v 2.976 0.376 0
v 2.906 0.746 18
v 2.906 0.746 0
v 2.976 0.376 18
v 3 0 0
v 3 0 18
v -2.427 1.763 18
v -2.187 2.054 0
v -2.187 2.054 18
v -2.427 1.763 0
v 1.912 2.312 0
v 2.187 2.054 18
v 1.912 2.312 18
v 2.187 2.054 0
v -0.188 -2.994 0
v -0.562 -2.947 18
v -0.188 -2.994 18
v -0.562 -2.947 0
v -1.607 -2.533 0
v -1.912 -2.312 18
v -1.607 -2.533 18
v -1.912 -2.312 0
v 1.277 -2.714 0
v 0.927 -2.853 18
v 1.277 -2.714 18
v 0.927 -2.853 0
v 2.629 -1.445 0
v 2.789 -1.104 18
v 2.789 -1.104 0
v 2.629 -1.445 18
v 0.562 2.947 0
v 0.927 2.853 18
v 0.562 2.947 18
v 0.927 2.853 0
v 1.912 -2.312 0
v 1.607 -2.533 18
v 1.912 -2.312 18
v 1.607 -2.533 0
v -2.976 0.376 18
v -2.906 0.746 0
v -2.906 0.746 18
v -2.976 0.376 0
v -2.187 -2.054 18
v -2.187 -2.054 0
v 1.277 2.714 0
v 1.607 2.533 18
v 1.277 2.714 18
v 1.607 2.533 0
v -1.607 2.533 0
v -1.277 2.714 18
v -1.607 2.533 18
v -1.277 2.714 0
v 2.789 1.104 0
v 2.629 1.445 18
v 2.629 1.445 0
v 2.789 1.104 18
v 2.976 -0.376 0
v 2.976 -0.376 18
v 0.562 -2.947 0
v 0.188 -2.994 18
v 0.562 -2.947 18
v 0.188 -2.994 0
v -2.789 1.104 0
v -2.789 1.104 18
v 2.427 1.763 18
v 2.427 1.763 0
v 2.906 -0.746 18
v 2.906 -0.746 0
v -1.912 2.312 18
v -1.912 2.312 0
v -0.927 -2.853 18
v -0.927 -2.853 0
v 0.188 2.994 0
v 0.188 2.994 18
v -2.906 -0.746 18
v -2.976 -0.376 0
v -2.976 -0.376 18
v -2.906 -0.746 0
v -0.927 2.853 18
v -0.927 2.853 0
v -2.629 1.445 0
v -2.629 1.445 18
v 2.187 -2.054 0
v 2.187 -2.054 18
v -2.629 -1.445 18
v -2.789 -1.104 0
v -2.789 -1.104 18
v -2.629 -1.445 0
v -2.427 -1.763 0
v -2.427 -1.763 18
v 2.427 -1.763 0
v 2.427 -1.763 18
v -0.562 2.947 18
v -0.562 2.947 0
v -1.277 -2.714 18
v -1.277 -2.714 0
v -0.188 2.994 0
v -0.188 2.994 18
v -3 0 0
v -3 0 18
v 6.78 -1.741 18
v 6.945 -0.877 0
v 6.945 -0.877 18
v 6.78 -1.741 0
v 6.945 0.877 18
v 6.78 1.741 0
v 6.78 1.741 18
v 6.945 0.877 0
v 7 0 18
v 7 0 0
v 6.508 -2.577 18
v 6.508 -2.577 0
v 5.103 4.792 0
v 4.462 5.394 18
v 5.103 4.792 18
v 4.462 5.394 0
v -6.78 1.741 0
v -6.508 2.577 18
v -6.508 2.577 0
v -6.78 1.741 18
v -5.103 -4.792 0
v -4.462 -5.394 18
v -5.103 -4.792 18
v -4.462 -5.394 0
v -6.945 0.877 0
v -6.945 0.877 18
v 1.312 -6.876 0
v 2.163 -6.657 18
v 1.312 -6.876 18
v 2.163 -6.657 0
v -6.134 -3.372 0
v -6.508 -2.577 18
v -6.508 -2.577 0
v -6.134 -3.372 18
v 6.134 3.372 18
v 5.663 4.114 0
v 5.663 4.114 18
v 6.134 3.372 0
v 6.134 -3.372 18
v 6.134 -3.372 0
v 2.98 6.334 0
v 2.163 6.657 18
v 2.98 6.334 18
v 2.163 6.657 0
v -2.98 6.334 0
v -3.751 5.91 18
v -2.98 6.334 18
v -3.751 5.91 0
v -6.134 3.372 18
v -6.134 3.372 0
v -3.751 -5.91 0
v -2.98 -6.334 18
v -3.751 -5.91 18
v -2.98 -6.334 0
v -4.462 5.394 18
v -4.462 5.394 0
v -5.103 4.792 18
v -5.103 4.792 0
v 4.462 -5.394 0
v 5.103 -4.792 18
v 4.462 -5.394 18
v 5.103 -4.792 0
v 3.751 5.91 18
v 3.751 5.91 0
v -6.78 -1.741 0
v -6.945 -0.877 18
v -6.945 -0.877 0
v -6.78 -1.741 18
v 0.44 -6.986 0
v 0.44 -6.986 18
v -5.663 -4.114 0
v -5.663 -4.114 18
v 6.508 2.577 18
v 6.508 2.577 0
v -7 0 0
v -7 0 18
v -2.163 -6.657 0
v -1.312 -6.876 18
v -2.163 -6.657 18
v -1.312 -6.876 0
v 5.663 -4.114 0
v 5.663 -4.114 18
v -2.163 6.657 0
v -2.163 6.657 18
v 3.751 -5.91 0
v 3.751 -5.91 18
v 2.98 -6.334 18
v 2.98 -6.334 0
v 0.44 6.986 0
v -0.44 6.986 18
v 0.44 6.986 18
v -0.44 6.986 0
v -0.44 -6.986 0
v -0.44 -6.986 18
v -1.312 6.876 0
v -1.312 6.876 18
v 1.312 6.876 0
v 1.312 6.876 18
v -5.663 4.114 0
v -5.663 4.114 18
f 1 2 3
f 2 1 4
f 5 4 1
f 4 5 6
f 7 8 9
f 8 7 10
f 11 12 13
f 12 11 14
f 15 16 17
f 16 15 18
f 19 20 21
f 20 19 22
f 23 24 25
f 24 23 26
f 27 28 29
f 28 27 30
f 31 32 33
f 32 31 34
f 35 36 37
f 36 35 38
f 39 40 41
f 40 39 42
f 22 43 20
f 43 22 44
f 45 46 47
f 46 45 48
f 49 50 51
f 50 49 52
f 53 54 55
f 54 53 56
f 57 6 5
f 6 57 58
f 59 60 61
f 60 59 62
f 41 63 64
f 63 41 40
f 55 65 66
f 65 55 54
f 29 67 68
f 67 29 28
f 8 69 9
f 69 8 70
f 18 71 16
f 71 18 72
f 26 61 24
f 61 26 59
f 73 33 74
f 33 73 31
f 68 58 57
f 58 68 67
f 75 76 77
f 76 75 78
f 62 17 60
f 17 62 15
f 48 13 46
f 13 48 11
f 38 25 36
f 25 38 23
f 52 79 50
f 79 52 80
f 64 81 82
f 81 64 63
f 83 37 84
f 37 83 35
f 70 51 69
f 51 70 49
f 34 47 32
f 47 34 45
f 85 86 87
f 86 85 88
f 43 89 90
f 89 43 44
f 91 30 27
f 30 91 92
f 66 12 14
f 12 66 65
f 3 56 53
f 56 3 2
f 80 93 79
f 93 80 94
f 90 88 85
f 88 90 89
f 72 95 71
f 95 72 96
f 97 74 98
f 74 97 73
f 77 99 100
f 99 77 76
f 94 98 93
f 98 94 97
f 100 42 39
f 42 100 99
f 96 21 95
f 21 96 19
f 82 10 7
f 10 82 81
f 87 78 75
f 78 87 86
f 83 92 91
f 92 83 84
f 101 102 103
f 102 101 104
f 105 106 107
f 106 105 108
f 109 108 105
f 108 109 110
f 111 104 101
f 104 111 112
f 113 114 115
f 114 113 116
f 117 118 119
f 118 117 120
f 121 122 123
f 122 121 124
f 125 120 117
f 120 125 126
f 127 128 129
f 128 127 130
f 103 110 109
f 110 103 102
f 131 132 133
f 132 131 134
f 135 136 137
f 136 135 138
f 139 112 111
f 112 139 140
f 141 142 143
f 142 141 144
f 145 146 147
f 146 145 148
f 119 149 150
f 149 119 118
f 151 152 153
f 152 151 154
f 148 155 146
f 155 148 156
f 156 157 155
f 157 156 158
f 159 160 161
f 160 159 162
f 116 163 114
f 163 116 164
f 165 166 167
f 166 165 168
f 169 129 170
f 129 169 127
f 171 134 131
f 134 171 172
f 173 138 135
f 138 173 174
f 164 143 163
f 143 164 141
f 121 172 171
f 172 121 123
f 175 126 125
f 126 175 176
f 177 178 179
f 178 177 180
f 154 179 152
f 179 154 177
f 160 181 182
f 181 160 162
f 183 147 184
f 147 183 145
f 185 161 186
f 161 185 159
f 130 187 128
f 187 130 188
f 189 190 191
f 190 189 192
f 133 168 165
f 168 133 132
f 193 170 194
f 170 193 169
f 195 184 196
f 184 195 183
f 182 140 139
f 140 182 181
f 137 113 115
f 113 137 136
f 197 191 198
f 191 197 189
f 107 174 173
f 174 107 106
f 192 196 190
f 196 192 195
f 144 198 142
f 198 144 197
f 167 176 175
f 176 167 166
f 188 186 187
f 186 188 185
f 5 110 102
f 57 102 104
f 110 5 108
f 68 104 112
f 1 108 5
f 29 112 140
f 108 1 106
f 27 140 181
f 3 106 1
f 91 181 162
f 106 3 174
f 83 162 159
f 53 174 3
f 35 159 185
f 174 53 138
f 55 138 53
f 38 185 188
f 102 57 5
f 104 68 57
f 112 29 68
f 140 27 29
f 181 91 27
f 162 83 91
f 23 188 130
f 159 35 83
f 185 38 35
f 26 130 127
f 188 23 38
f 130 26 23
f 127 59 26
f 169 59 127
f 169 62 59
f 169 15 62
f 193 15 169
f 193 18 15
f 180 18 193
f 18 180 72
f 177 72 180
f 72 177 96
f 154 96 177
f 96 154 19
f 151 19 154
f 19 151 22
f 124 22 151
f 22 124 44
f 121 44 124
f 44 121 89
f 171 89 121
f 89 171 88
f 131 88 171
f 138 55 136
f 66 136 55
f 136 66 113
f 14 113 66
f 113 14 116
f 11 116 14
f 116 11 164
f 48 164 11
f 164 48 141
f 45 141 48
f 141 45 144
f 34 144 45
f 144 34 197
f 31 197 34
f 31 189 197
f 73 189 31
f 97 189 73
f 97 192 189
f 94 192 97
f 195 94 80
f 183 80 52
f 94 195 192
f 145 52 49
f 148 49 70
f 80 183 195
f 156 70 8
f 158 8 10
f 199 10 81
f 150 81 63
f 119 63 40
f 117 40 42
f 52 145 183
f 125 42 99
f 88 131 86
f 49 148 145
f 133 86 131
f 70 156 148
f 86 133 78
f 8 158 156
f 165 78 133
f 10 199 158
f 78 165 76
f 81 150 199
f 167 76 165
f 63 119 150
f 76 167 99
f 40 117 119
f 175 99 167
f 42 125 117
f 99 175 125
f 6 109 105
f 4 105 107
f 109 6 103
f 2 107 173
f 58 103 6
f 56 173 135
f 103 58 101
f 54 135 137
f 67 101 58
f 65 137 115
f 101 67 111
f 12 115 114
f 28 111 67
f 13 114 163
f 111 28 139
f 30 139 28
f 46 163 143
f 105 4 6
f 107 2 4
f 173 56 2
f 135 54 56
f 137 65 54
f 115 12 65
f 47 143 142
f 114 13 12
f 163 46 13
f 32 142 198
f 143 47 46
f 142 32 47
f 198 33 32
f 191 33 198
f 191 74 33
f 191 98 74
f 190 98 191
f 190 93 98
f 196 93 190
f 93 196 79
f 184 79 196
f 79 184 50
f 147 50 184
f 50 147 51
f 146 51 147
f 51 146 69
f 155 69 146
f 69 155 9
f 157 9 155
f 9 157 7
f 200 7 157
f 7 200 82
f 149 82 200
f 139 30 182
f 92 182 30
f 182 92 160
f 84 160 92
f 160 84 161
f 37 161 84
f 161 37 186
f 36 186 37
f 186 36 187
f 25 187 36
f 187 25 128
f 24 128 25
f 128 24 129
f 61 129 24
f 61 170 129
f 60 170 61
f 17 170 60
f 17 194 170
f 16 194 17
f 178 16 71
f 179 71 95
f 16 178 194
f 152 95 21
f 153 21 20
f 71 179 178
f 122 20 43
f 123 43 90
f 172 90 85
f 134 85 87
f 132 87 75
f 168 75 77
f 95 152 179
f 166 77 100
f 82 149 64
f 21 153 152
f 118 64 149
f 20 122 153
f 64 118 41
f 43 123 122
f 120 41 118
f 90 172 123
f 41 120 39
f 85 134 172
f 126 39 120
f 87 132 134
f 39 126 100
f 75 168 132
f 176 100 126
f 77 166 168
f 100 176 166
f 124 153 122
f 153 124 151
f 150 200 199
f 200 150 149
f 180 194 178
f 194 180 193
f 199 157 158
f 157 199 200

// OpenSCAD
$fn = 50;


difference() {
	union() {
		*color(alpha = 1.0000000000, c = "gray") {
			translate(v = [0, 7, 0]) {
				linear_extrude(height = 1) {
					text(font = "Arial:style=Bold", halign = "center", size = 4.5000000000, text = "COMMENT plate main", valign = "center");
				}
			}
		}
		cylinder(h = 18, r = 7.0000000000);
	}
	union() {
		*color(alpha = 1.0000000000, c = "gray") {
			translate(v = [0, 7, 0]) {
				linear_extrude(height = 1) {
					text(font = "Arial:style=Bold", halign = "center", size = 4.5000000000, text = "COMMENT holes main", valign = "center");
				}
			}
		}
		translate(v = [0, 0, -100]) {
			cylinder(h = 200, r = 3.0000000000);
		}
		translate(v = [0, 0, -100]) {
			cylinder(h = 200, r = 1.5000000000);
		}
	}
}
